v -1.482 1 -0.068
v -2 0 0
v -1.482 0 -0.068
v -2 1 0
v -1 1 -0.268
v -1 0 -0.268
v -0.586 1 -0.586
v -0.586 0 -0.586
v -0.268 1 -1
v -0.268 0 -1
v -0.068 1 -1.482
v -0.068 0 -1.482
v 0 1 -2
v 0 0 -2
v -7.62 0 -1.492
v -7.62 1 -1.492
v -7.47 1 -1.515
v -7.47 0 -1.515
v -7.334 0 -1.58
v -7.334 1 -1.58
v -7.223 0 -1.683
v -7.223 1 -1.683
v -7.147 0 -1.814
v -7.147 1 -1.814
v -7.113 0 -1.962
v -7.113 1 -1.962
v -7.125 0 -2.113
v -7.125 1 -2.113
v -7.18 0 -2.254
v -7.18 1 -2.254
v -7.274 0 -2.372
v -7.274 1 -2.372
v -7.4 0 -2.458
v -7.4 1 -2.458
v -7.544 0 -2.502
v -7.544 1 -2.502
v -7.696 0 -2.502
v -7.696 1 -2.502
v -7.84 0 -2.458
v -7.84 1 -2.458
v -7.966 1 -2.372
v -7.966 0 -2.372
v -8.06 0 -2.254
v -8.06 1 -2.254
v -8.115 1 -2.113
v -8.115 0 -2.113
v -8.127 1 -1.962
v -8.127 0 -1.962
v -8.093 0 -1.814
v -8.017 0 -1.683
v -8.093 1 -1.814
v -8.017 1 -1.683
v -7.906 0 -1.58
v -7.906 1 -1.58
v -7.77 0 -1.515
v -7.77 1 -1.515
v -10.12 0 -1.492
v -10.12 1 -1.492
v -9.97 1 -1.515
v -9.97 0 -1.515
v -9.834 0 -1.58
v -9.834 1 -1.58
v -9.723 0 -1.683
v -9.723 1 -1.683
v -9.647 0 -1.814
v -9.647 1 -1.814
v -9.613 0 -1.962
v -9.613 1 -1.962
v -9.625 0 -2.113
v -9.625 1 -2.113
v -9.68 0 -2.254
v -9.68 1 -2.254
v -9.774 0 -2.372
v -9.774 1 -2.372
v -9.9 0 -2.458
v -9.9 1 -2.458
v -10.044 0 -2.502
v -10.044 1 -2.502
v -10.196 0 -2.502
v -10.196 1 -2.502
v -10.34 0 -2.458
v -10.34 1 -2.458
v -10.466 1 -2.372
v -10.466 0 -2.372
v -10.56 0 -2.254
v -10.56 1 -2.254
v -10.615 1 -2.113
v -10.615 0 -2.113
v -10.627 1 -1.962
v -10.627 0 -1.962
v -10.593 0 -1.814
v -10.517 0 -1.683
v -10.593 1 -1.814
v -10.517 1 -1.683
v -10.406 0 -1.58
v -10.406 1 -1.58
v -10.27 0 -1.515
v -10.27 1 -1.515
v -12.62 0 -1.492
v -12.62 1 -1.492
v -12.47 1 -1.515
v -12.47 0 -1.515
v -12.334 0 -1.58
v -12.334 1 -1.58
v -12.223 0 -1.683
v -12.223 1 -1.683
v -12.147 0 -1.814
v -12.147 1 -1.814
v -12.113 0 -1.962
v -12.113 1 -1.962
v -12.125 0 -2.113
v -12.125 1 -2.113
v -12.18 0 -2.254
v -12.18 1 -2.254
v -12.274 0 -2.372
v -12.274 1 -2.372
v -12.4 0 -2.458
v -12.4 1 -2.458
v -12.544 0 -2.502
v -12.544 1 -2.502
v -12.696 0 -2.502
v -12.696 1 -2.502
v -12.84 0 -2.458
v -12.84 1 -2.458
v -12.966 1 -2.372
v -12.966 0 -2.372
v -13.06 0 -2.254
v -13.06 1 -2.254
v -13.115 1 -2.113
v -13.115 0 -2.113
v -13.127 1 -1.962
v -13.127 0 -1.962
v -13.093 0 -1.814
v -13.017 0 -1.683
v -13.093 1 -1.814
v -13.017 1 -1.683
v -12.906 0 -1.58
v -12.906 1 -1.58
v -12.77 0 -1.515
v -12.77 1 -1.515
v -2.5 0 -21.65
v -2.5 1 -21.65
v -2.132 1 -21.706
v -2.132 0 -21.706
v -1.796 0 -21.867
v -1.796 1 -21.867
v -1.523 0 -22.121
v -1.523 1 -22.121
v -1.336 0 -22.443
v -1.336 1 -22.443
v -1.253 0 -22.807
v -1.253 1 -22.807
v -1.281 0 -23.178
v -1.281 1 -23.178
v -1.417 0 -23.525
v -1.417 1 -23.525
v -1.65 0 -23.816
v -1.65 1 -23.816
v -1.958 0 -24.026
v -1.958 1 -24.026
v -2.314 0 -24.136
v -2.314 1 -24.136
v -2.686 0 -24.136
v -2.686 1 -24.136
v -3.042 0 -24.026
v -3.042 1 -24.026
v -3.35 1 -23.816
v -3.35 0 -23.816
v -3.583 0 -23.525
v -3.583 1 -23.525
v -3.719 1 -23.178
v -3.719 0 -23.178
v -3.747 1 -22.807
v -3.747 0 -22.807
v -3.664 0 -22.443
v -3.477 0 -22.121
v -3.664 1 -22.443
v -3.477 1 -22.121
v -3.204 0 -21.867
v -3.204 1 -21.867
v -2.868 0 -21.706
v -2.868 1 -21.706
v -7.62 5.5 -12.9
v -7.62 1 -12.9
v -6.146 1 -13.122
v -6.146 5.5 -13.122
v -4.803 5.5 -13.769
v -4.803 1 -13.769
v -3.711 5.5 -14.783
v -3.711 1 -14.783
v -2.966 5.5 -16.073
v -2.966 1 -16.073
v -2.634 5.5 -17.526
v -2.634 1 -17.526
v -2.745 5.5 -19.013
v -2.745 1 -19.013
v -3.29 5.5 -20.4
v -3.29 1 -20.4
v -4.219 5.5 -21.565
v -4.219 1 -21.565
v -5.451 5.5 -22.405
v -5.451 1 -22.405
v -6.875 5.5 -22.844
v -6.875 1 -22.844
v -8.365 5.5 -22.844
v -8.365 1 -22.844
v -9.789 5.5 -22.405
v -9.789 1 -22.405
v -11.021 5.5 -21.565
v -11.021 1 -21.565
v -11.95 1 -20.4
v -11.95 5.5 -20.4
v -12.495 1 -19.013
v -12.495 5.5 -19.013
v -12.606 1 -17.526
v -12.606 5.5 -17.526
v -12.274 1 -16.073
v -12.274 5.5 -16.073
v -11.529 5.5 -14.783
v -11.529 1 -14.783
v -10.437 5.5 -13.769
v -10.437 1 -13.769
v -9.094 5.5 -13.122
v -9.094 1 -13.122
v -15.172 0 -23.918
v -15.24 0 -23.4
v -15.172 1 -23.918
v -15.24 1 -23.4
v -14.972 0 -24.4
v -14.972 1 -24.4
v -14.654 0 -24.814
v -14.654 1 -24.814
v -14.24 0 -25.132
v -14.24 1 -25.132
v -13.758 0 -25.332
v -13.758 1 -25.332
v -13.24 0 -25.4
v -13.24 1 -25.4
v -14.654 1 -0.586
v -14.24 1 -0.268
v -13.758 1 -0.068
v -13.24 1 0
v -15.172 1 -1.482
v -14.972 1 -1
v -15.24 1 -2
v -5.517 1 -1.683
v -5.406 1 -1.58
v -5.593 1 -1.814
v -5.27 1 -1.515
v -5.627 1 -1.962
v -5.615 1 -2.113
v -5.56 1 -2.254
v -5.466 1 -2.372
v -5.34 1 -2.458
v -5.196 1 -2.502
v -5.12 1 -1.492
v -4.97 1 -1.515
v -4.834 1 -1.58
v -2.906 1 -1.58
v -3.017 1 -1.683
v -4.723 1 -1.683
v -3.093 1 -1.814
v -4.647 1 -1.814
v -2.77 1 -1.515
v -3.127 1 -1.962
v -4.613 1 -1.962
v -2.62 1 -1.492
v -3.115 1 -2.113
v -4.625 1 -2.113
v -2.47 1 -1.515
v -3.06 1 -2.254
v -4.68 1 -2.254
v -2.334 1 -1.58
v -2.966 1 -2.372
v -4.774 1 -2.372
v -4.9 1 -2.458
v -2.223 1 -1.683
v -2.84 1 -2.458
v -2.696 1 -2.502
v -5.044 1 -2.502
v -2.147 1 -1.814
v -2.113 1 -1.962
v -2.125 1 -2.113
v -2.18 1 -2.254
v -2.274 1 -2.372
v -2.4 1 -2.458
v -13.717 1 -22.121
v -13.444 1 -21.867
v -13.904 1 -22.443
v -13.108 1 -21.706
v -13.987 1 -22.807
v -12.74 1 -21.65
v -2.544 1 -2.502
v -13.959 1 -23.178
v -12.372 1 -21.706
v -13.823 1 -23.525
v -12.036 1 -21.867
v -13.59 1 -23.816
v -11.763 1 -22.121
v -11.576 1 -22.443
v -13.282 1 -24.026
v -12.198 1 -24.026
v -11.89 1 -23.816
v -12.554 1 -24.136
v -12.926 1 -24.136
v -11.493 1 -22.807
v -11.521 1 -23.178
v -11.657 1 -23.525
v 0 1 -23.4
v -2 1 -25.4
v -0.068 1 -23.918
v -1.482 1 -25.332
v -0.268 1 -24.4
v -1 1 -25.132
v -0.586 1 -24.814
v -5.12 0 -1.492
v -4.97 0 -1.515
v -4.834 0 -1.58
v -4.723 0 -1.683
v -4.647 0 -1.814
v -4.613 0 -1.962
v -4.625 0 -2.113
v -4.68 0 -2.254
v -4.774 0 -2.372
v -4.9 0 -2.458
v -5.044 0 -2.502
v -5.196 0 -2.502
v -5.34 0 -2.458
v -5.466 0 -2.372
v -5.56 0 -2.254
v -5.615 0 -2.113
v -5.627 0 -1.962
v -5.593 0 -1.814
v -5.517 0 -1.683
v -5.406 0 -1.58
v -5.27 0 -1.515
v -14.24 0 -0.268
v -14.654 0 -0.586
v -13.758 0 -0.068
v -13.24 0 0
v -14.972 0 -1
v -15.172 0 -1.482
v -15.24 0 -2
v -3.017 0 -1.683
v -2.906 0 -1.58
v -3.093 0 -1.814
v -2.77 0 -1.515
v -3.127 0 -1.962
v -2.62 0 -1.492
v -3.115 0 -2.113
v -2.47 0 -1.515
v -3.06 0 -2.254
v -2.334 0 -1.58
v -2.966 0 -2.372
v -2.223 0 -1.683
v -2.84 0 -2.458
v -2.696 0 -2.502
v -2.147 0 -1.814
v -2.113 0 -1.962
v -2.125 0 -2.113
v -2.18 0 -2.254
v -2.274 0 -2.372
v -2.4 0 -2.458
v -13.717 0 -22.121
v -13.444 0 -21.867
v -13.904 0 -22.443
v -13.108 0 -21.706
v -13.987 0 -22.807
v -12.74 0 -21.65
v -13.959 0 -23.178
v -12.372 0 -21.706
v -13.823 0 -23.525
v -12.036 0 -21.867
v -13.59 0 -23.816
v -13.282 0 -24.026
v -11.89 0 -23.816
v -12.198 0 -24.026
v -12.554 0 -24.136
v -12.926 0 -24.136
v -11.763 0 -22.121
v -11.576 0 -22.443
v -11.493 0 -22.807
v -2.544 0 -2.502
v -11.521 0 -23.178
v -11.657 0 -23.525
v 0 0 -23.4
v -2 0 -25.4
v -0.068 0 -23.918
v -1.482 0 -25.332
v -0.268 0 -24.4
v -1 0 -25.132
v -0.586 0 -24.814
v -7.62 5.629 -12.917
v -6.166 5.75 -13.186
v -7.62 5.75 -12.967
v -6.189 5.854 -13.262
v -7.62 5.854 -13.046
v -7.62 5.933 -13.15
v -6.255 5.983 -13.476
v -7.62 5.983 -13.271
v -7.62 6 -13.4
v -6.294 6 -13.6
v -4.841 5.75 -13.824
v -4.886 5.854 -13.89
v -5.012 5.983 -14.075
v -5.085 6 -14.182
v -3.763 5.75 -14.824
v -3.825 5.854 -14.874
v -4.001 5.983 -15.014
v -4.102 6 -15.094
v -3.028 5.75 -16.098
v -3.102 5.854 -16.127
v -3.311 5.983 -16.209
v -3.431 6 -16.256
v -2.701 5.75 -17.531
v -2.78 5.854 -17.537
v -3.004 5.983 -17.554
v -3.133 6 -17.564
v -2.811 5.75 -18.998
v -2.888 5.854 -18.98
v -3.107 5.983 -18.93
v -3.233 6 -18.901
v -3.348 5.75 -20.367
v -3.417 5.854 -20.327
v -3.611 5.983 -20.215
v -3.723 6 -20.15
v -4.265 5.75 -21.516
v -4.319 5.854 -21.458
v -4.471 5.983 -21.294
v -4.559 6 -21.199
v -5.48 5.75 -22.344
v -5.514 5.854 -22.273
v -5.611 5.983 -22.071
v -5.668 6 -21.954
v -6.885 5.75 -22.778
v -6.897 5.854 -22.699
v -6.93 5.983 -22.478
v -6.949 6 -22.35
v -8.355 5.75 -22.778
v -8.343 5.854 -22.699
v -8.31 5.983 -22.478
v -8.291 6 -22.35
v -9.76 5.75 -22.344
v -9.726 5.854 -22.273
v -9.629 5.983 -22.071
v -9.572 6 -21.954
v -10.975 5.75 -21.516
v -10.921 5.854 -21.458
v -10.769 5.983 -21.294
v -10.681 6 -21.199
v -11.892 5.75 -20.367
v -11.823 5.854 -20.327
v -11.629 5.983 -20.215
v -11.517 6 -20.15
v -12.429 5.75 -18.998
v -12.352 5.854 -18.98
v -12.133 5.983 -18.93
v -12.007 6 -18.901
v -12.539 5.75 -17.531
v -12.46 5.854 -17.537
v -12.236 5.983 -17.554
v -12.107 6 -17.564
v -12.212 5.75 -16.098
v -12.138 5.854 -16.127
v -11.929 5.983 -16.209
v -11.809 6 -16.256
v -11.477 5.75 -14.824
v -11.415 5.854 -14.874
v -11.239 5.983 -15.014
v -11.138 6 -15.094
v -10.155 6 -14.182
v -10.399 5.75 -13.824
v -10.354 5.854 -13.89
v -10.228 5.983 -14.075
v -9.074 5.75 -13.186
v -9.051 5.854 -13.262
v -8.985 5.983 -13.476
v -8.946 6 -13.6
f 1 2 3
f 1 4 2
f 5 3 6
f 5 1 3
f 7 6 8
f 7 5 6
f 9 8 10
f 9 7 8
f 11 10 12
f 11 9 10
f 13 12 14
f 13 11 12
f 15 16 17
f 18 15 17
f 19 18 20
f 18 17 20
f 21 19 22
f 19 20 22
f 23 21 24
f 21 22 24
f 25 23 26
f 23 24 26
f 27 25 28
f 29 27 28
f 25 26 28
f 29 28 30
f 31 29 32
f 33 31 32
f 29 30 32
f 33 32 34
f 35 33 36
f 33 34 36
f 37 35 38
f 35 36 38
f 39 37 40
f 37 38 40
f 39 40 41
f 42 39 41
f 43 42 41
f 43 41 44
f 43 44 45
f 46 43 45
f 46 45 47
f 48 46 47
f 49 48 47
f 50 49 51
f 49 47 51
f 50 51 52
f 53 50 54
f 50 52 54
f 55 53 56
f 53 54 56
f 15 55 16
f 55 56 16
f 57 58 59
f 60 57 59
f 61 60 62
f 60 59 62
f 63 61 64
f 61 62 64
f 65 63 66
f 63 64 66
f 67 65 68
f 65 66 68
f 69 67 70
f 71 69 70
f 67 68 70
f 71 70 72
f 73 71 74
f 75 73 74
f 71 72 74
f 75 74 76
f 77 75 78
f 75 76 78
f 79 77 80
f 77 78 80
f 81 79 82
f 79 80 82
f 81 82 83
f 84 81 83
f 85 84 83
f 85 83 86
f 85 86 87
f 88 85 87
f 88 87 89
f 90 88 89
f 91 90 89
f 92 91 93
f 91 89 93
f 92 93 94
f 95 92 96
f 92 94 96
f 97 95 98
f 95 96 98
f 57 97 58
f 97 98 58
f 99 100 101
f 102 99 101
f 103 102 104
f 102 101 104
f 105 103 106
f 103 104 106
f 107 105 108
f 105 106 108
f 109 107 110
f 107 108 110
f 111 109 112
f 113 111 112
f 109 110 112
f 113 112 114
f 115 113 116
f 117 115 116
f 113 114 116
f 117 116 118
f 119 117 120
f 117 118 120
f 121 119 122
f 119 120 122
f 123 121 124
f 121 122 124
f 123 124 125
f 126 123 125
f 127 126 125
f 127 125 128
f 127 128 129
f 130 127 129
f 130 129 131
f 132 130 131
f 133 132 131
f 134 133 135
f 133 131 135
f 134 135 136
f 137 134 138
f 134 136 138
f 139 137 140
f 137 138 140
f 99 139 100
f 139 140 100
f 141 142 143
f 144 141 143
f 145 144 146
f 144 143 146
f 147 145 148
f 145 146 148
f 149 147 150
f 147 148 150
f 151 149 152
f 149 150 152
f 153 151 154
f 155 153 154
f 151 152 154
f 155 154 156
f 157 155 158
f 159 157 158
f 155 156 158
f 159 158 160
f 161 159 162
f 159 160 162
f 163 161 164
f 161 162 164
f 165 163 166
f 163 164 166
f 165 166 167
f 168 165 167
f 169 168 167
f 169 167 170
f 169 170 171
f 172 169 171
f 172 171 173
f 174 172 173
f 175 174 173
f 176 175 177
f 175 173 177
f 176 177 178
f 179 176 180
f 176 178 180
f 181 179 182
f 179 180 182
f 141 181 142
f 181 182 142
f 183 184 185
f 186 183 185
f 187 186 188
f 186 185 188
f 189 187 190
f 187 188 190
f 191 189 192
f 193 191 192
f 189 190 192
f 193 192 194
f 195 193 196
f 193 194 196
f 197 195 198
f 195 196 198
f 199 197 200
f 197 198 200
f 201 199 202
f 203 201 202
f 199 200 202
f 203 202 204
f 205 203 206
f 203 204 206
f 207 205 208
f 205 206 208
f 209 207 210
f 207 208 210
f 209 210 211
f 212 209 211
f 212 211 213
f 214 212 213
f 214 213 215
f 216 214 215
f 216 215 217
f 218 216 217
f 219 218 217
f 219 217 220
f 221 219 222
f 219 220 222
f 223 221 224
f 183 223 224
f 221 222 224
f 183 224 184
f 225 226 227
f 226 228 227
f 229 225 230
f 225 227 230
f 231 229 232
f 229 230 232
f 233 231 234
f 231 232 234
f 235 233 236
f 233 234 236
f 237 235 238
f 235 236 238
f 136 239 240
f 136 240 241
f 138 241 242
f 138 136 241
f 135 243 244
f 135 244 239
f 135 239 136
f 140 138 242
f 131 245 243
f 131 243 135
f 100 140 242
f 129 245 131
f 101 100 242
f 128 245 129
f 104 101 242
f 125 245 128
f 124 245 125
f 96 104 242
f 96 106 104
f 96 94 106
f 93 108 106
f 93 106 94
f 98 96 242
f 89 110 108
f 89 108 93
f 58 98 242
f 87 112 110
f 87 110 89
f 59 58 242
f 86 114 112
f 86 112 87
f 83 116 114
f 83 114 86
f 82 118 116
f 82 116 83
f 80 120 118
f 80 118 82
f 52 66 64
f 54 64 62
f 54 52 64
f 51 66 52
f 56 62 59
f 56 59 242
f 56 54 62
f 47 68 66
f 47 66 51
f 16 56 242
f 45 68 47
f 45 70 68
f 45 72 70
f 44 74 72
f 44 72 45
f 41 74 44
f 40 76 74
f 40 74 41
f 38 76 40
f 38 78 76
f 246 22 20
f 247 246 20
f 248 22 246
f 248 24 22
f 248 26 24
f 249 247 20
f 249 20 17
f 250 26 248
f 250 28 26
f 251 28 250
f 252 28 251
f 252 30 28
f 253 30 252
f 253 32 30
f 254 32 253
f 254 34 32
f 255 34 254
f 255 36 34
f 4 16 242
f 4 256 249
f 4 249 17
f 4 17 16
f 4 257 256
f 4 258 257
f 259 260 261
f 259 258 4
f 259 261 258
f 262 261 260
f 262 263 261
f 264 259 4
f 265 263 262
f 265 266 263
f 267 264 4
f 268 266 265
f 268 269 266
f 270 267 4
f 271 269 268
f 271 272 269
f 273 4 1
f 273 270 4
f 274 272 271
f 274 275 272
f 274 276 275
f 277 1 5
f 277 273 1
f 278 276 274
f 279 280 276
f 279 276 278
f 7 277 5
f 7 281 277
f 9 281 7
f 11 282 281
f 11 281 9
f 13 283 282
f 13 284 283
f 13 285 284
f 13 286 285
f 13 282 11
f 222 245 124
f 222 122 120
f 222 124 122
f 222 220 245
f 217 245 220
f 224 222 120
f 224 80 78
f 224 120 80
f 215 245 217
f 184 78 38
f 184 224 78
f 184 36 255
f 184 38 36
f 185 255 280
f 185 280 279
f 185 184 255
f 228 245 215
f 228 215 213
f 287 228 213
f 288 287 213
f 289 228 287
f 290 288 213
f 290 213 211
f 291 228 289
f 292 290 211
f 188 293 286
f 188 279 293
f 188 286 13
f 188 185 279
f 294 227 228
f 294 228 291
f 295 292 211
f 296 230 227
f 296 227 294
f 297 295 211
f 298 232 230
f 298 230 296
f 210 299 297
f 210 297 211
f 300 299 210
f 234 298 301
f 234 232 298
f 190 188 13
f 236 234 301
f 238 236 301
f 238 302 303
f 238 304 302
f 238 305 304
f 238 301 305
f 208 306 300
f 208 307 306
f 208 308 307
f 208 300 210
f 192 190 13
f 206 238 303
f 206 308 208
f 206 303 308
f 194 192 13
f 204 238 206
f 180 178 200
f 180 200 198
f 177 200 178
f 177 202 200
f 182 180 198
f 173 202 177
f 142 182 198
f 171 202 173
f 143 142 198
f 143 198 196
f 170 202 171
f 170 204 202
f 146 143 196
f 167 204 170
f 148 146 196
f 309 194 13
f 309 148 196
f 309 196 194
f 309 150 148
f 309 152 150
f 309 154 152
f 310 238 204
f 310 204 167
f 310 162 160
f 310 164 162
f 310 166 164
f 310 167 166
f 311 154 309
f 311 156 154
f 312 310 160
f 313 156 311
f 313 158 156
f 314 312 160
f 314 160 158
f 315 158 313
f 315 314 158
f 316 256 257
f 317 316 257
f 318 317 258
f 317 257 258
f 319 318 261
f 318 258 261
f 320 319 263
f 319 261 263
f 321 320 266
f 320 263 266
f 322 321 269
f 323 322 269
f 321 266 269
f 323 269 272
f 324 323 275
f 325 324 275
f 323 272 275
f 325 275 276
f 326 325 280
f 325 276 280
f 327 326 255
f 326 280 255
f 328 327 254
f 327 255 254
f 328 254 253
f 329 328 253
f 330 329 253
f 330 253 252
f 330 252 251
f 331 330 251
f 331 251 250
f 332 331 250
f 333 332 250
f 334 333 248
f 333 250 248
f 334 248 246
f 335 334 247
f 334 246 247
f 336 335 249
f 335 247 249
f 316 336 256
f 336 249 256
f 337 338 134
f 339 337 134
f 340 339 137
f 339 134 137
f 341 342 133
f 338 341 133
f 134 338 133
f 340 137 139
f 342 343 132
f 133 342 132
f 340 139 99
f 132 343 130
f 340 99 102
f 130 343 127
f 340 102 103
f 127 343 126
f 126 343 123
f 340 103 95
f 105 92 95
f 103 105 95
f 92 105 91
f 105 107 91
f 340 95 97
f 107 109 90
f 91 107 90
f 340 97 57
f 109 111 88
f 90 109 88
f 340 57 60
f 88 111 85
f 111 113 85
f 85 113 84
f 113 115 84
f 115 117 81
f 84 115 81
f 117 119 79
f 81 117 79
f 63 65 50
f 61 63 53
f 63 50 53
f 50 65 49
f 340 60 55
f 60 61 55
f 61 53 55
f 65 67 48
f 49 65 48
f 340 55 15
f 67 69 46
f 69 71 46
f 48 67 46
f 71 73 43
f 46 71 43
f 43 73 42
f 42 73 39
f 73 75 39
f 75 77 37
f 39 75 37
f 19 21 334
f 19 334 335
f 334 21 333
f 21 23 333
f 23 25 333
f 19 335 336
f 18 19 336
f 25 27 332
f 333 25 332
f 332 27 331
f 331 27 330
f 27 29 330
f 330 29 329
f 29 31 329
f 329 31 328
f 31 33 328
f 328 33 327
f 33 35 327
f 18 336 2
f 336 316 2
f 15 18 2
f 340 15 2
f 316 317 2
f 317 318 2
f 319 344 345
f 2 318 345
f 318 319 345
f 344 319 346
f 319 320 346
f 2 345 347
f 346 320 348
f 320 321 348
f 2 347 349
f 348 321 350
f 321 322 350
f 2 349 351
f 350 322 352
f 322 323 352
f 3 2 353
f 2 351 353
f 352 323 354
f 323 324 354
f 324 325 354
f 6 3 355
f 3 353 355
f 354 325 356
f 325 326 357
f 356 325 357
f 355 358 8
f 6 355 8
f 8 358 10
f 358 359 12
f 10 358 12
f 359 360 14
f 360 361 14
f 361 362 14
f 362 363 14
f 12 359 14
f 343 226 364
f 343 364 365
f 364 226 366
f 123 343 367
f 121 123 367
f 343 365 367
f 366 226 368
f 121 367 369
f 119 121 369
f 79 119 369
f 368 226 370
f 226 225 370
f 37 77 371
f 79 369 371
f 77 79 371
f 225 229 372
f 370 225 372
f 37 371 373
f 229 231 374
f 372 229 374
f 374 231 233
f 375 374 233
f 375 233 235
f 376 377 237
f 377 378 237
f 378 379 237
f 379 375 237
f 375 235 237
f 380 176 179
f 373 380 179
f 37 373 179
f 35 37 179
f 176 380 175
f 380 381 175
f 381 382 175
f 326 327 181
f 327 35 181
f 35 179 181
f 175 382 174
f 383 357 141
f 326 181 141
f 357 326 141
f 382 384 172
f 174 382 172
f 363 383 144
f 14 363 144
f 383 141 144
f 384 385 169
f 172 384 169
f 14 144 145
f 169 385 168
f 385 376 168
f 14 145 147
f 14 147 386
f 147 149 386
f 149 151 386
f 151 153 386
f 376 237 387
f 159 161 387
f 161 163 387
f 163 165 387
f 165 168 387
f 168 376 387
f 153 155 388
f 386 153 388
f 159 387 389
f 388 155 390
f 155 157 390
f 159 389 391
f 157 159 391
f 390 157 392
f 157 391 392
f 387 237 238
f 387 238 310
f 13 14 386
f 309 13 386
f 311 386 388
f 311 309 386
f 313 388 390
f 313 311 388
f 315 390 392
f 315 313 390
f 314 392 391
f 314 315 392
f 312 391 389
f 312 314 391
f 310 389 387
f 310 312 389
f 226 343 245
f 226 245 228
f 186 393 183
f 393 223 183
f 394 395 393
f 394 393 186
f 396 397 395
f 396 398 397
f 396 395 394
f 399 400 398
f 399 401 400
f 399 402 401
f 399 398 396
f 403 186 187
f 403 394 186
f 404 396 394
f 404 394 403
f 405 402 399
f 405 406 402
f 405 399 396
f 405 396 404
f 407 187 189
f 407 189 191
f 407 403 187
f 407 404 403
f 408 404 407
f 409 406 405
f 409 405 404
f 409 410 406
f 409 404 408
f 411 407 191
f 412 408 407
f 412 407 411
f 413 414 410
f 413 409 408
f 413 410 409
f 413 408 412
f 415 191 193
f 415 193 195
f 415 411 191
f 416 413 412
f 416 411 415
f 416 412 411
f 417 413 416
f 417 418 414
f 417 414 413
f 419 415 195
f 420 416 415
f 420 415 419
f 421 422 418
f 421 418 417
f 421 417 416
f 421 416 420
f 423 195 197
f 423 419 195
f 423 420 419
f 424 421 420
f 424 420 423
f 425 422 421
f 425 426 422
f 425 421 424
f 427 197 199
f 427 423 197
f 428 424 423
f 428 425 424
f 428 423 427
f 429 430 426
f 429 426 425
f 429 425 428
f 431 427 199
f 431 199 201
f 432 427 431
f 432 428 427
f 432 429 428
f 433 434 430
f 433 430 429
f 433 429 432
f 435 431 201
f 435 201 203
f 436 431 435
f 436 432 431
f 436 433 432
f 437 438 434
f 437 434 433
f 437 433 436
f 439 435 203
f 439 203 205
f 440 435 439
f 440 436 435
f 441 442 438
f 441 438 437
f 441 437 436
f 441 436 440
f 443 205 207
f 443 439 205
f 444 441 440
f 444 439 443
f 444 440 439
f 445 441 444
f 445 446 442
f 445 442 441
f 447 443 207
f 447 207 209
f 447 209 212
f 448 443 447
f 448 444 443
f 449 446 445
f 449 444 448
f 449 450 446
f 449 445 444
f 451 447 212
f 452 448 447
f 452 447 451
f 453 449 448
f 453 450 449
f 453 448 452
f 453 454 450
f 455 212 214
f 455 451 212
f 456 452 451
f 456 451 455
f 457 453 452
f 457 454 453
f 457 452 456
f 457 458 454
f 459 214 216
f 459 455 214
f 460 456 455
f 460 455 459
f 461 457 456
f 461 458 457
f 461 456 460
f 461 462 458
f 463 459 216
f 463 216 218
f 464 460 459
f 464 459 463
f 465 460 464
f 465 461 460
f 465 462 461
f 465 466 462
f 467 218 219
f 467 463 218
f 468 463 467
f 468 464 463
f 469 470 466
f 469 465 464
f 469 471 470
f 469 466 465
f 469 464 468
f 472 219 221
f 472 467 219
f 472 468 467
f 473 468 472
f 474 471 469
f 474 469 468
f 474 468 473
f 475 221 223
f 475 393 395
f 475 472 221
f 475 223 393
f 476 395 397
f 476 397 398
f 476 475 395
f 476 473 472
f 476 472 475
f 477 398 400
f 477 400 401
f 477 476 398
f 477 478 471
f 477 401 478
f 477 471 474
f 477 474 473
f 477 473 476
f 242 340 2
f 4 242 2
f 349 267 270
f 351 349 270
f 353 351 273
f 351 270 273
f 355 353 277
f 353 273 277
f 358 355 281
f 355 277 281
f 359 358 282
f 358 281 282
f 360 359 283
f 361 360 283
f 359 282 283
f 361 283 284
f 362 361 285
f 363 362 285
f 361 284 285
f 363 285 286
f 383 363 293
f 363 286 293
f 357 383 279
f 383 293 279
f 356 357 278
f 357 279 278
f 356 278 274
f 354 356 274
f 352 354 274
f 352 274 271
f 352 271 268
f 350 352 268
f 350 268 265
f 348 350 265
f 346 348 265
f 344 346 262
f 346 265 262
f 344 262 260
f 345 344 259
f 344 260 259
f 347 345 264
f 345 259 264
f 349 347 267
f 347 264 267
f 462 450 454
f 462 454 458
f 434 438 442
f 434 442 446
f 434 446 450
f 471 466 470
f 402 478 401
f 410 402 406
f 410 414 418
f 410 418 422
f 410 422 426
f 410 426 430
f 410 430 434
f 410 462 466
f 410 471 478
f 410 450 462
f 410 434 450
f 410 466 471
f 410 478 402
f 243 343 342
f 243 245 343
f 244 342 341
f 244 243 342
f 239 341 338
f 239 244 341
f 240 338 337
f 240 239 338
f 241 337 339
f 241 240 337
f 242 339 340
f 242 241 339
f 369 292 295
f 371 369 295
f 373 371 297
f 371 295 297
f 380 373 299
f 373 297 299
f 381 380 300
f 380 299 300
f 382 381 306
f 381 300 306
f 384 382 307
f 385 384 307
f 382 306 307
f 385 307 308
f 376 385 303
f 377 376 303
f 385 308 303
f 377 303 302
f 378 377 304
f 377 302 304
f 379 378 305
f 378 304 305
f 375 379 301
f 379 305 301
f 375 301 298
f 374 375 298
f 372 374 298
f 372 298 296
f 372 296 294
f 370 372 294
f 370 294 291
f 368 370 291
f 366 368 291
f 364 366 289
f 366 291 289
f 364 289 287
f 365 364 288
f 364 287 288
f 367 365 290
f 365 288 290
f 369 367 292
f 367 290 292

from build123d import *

# Parameters (mm, degrees)
SKETCH1_W           = 15.24
SKETCH1_H           = 25.4
BOSS_EXTRUDE1_DEPTH = 1
FILLET1_R           = 2
SKETCH2_R           = 1.25
SKETCH2_R_2         = 0.508
CUT_EXTRUDE1_DEPTH  = 1
SKETCH3_R           = 5
BOSS_EXTRUDE2_DEPTH = 5
FILLET2_R           = 0.5


with BuildPart() as part:
    # Sketch1 → Boss-Extrude1 (new body)
    with BuildSketch(Plane(origin=(0, 0, 0), x_dir=(1, 0, 0), z_dir=(0, 1, 0))):
        with Locations((-7.62, 12.7)):
            Rectangle(SKETCH1_W, SKETCH1_H)
    extrude(amount=BOSS_EXTRUDE1_DEPTH)

    # Fillet1
    fillet1_edges = [part.edges().sort_by_distance(p)[0] for p in [
        (0, 0.5, 0),
        (-15.24, 0.5, 0),
        (-15.24, 0.5, -25.4),
        (0, 0.5, -25.4),
    ]]
    fillet(fillet1_edges, radius=FILLET1_R)

    # Sketch2 → Cut-Extrude1 (cut)
    with BuildSketch(Plane(origin=(0, 1, 0), x_dir=(1, 0, 0), z_dir=(0, 1, 0))):
        with Locations(Location((-2.5, 22.9, 0), (0, 0, 270))):
            Circle(SKETCH2_R)
        with Locations(Location((-12.74, 22.9, 0), (0, 0, 270))):
            Circle(SKETCH2_R)
        with Locations(Location((-12.62, 2, 0), (0, 0, 270))):
            Circle(SKETCH2_R_2)
        with Locations(Location((-10.12, 2, 0), (0, 0, 270))):
            Circle(SKETCH2_R_2)
        with Locations(Location((-7.62, 2, 0), (0, 0, 270))):
            Circle(SKETCH2_R_2)
        with Locations(Location((-5.12, 2, 0), (0, 0, 270))):
            Circle(SKETCH2_R_2)
        with Locations(Location((-2.62, 2, 0), (0, 0, 270))):
            Circle(SKETCH2_R_2)
    extrude(amount=-CUT_EXTRUDE1_DEPTH, mode=Mode.SUBTRACT)

    # Sketch3 → Boss-Extrude2 (add)
    with BuildSketch(Plane(origin=(0, 1, 0), x_dir=(1, 0, 0), z_dir=(0, 1, 0))):
        with Locations(Location((-7.62, 17.9, 0), (0, 0, 270))):
            Circle(SKETCH3_R)
    extrude(amount=BOSS_EXTRUDE2_DEPTH)

    # Fillet2
    fillet2_edges = [part.edges().sort_by_distance(p)[0] for p in [
        (-7.62, 6, -22.9),
    ]]
    fillet(fillet2_edges, radius=FILLET2_R)


solid = part.part
